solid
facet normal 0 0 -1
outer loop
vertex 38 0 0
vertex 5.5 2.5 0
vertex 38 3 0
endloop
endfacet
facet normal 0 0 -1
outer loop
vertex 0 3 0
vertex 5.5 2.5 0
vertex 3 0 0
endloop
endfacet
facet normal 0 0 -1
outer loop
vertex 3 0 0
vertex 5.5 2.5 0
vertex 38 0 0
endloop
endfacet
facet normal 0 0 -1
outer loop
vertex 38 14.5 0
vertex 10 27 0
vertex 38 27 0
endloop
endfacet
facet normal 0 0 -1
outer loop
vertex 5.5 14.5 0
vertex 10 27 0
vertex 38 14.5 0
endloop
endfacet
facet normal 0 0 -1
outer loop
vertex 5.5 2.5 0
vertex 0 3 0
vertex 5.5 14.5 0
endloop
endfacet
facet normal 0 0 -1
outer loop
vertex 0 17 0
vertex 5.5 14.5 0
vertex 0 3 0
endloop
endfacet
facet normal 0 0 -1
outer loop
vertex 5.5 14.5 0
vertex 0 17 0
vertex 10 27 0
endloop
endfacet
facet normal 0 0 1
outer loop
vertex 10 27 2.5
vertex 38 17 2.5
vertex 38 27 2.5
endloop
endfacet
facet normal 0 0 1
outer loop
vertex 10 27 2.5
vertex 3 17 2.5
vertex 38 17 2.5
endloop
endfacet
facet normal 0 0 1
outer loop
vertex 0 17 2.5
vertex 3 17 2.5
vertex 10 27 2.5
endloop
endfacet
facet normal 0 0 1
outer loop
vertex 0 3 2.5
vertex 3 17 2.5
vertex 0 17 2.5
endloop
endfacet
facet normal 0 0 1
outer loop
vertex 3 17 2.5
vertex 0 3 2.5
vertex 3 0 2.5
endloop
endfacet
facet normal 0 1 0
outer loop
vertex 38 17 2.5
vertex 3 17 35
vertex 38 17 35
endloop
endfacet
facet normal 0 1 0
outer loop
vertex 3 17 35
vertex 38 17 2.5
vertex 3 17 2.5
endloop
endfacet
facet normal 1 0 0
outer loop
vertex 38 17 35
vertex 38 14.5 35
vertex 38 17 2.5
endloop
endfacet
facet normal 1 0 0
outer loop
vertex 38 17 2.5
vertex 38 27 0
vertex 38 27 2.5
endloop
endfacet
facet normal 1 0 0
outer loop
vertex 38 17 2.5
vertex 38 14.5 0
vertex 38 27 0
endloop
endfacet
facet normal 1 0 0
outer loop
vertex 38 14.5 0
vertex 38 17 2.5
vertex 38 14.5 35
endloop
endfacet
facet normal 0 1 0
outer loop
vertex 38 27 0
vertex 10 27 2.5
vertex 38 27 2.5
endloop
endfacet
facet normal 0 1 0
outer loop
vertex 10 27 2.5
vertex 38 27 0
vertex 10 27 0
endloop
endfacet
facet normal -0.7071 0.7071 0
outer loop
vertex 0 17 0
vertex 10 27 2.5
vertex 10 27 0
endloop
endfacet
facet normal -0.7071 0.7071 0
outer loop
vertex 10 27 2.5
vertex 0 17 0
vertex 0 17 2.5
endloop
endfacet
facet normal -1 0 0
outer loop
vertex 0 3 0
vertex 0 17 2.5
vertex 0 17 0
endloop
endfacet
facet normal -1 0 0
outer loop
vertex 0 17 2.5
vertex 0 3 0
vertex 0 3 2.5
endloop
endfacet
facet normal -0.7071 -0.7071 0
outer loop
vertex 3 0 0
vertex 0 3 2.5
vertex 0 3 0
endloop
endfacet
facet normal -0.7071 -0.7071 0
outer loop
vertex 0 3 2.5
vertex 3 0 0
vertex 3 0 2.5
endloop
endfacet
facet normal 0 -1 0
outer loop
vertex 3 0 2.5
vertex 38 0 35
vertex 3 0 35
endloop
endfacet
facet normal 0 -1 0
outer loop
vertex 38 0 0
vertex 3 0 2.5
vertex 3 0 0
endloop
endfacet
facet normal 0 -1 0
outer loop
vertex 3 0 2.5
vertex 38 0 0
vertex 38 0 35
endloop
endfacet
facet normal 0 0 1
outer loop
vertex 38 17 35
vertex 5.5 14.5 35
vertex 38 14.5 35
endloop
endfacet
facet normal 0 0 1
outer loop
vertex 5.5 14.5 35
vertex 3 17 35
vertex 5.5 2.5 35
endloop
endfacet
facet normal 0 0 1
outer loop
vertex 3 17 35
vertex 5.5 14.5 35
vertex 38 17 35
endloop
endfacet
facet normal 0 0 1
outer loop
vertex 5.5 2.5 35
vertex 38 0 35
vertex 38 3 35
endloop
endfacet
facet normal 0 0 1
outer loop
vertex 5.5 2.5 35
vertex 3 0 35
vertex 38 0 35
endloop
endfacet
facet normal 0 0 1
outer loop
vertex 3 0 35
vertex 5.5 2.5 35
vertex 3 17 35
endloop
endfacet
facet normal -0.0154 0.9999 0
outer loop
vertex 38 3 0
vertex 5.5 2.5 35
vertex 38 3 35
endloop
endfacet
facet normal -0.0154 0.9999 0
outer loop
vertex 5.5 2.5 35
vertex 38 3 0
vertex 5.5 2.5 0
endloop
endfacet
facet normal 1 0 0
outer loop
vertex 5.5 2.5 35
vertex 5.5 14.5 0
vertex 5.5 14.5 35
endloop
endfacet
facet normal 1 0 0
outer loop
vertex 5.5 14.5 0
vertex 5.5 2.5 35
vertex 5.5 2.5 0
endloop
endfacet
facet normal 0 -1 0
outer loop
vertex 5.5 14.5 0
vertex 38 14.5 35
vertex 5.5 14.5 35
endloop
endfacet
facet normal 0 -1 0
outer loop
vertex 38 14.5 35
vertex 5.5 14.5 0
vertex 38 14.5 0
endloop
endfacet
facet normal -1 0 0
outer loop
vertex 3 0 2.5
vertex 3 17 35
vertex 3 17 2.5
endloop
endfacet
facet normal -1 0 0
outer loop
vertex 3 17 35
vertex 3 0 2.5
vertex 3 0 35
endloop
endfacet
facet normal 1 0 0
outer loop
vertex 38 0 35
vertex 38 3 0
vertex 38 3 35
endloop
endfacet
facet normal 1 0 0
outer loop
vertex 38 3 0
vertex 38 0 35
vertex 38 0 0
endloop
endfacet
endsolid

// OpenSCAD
// created by IndiePandaaaaa
// encoding: utf-8

THICKNESS = 2.5;
$fn = $preview ? 25 : 75;

// made as A4 guide for HP ScanJet Pro 3000 s4

union() {
  linear_extrude(height=THICKNESS, center=false, convexity=10, twist=0, slices=20, scale=1.0) {
    le = 10;
    polygon(
      points=[
        [0, 3],
        [3, 0],
        [5, 0],
        [5, THICKNESS * 2 + 12],
        [35 + 3, THICKNESS * 2 + 12],
        [35 + 3, THICKNESS * 2 + 12 + le],
        [le, THICKNESS * 2 + 12 + le],
        [0, THICKNESS * 2 + 12],
      ]
    );
  }
  translate(v=[3, 0, 0]) linear_extrude(height=35, center=false, convexity=10, twist=0, slices=20, scale=1.0) {
      polygon(
        points=[
          [0, 0],
          [35, 0],
          [35, THICKNESS + .5],
          [THICKNESS, THICKNESS],
          [THICKNESS, THICKNESS + 12],
          [35, THICKNESS + 12],
          [35, THICKNESS * 2 + 12],
          [0, THICKNESS * 2 + 12],
        ]
      );
    }
}
